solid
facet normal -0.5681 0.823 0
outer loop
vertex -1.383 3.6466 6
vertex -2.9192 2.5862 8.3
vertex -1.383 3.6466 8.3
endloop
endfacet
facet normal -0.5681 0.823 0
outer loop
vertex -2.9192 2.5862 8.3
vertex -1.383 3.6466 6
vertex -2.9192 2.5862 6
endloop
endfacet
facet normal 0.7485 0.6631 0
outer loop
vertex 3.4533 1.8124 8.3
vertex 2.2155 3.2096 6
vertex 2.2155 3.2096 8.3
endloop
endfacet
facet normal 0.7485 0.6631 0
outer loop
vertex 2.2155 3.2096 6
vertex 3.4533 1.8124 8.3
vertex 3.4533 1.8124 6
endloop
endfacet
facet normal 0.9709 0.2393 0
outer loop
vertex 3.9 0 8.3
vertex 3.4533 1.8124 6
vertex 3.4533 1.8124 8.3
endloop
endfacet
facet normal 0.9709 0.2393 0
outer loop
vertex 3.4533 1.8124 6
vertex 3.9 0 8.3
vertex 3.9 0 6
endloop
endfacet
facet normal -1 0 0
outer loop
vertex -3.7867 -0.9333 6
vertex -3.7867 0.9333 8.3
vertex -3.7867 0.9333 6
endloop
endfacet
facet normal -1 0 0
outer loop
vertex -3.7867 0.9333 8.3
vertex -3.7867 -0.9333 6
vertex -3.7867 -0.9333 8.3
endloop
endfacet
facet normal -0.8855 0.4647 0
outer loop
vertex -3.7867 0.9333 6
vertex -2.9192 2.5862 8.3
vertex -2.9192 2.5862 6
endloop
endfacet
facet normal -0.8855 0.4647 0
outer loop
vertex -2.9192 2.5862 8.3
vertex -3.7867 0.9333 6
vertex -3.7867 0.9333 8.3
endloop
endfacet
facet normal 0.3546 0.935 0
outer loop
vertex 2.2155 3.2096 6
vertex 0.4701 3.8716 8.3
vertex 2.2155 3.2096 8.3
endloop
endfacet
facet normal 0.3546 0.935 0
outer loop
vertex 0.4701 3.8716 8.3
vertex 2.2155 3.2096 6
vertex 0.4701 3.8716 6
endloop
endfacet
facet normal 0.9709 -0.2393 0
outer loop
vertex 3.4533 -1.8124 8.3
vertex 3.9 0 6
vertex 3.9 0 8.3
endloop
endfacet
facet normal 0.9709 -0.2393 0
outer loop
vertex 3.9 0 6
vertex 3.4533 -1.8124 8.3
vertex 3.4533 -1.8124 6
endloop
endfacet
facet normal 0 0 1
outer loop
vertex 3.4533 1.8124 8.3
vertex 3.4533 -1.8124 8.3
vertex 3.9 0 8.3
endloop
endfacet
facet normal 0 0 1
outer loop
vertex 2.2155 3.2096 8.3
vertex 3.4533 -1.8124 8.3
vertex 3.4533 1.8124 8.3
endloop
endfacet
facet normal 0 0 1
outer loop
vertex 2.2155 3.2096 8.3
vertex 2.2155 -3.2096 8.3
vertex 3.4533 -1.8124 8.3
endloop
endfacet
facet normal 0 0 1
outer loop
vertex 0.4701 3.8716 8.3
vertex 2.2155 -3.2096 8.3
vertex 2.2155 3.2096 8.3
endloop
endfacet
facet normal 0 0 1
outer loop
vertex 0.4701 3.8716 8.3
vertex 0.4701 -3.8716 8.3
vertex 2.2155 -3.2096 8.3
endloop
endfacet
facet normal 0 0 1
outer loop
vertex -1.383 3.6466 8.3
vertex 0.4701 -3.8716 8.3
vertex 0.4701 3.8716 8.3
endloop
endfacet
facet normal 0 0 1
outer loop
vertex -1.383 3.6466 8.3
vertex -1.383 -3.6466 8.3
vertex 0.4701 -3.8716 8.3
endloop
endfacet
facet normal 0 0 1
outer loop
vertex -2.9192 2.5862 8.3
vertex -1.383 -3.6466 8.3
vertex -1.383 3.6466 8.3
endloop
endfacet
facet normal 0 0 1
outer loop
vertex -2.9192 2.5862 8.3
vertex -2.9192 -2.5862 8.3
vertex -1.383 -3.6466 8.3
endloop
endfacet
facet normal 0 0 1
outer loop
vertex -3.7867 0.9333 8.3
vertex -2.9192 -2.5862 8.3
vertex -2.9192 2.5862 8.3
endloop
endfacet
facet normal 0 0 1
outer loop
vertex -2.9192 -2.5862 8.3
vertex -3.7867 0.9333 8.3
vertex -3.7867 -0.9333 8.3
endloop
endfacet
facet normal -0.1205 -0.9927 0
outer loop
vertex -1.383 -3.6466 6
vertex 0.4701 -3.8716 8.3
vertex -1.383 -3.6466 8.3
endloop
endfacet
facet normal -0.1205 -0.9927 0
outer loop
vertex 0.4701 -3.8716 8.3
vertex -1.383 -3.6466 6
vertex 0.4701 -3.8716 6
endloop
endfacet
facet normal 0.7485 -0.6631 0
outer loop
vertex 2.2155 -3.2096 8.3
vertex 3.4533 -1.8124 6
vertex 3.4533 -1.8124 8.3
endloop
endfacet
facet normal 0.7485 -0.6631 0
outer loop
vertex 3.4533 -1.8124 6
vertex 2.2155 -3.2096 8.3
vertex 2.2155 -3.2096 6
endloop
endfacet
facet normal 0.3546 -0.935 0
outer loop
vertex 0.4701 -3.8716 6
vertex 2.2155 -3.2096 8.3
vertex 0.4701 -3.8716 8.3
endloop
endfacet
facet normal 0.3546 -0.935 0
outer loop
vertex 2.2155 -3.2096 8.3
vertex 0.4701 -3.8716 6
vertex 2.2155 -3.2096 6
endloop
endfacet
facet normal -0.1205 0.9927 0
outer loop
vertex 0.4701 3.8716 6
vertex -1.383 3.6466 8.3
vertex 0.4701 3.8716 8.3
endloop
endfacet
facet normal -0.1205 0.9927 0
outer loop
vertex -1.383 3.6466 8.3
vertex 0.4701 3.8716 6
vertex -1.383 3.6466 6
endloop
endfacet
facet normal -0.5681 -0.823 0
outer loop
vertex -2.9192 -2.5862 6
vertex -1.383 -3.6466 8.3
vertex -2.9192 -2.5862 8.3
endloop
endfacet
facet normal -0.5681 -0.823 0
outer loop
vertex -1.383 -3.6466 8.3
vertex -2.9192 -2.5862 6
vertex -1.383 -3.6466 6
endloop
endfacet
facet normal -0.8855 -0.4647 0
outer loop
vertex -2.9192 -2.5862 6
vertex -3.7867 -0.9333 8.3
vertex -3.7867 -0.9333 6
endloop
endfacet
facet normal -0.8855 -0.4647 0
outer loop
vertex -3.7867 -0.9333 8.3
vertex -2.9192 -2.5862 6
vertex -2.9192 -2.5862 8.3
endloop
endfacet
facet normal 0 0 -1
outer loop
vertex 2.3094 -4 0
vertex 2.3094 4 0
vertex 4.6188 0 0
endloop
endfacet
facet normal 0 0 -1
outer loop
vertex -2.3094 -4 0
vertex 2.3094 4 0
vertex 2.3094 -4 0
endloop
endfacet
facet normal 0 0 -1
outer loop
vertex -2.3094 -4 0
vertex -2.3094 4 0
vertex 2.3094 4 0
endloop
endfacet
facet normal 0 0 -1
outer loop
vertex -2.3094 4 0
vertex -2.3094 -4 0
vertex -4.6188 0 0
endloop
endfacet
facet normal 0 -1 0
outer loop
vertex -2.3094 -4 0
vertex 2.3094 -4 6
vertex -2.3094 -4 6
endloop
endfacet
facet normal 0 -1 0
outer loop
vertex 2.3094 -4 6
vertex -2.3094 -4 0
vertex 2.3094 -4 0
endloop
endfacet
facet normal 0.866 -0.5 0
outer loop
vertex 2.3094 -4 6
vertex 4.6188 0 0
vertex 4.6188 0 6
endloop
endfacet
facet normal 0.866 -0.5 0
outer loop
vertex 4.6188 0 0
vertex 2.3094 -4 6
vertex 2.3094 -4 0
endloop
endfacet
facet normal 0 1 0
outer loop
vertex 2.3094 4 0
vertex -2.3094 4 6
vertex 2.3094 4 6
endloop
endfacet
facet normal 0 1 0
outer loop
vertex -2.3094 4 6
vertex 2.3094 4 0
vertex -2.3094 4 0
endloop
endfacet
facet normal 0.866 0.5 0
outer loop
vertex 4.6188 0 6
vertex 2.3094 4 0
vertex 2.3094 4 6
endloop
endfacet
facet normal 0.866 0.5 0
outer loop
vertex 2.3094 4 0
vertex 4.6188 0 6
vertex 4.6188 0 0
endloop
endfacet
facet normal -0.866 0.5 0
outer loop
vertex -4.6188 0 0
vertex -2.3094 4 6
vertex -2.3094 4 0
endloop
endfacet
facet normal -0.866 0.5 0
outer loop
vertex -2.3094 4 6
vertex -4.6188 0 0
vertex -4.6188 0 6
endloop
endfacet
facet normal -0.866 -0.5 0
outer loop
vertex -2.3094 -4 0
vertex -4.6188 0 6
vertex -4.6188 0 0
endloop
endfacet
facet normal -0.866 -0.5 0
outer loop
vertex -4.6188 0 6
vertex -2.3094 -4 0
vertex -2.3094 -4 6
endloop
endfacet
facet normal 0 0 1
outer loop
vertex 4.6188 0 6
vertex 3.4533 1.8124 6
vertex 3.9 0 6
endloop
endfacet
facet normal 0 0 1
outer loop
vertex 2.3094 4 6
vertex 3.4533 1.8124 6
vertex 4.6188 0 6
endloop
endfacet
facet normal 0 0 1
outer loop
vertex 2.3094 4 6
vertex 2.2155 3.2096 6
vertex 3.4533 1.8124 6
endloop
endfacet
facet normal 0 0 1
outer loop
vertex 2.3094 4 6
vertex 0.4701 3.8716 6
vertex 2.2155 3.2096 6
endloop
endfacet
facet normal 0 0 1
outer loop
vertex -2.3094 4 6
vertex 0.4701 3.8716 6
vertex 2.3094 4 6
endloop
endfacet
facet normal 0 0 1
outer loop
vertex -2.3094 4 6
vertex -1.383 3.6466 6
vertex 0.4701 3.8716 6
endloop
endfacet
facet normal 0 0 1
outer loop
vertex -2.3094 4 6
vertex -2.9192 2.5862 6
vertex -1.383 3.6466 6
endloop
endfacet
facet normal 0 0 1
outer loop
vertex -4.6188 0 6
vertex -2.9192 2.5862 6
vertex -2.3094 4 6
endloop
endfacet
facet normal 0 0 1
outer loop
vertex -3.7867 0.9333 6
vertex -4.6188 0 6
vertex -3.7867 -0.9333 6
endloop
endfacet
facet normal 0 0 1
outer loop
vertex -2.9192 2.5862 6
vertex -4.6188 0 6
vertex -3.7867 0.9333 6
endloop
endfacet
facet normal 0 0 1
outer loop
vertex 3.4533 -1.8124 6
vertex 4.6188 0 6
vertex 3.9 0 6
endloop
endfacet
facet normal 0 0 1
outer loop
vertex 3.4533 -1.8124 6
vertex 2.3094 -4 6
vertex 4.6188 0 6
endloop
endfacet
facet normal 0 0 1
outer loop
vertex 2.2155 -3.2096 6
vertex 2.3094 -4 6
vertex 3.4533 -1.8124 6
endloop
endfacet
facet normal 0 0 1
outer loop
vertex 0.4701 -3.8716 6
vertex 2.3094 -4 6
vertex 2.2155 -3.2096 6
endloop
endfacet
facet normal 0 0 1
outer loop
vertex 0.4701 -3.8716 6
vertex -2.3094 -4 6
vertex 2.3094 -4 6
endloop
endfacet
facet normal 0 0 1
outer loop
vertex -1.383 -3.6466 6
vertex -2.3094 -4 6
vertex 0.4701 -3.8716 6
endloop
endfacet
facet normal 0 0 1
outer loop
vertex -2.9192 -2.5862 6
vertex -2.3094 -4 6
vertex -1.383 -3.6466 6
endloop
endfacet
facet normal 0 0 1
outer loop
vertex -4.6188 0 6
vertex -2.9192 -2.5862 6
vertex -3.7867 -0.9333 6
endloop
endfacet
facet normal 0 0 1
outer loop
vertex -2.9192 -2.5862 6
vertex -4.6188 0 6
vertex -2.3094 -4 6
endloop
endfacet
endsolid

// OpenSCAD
// file: util.scad
module centerCube(v){
    translate([-v[0]/2,-v[1]/2,0]) cube(v);
}

module nObj(r, n, offs){
    for(a=[1:n]) rotate([0,0, offs+a*360/n]) translate([r,0,0]) children();
}

module quad(d){
    nObj(sqrt(2)*d, 4, 45) children();
}

module quad2(x,y){
    translate([x,y,0]) children();
    translate([x,-y,0]) children();
    translate([-x,y,0]) children();
    translate([-x,-y,0]) children();
}

module zt(z){
    translate([0,0,z]) children();
}

module xt(x){
    translate([x,0,0]) children();
}

module yt(y){
    translate([0,y,0]) children();
}

module zr(z){
    rotate([0,0,z]) children();
}

module xr(x){
    rotate([x,0,0]) children();
}

module yr(y){
    rotate([0,y,0]) children();
}
// main file
use <util.scad>

module smaFemale(threadedL, totalL){
    cylinder(threadedL, 6.3/2, 6.3/2);
    cylinder(totalL, 4.8/2, 4.8/2);
}


module tncFemale(threadedL, totalL){
    cylinder(threadedL, 11/2, 11/2);
    cylinder(totalL, 9.8/2, 9.8/2);
}

module nFemale(neckL, totalL){
    xr(180) zt(-totalL){
        cylinder(8.5, 14.2/2, 14.2/2);
        zt(1.6) cylinder(4.5, 15.8/2, 15.8/2);
        //cylinder(threadedL, 11/2, 11/2);
        cylinder(totalL, 9.8/2, 9.8/2);
        zt(8.5) cylinder(totalL-8.5, 16/2, 16/2);
    }
}

module nMale(){
    cylinder(17, 19.5/2, 19.5/2);
    zt(4.5) cylinder(10.5, 20.2/2, 20.2/2);
}

module bananaFemale(){
    cylinder(4,6,6);
    zt(-28)cylinder(28,4,4);
    zt(-1) hull() {
        cylinder(1,1,1);
        xt(5)cylinder(1,1,1,$fn=10);
    }
}

module smaMale(){
    r=8/cos(360/12)/2;
    cylinder(8.3, 7.8/2, 7.8/2);
    cylinder(6, r, r, $fn=6);
}

smaMale();
//bananaFemale();
//nFemale(11,19);
